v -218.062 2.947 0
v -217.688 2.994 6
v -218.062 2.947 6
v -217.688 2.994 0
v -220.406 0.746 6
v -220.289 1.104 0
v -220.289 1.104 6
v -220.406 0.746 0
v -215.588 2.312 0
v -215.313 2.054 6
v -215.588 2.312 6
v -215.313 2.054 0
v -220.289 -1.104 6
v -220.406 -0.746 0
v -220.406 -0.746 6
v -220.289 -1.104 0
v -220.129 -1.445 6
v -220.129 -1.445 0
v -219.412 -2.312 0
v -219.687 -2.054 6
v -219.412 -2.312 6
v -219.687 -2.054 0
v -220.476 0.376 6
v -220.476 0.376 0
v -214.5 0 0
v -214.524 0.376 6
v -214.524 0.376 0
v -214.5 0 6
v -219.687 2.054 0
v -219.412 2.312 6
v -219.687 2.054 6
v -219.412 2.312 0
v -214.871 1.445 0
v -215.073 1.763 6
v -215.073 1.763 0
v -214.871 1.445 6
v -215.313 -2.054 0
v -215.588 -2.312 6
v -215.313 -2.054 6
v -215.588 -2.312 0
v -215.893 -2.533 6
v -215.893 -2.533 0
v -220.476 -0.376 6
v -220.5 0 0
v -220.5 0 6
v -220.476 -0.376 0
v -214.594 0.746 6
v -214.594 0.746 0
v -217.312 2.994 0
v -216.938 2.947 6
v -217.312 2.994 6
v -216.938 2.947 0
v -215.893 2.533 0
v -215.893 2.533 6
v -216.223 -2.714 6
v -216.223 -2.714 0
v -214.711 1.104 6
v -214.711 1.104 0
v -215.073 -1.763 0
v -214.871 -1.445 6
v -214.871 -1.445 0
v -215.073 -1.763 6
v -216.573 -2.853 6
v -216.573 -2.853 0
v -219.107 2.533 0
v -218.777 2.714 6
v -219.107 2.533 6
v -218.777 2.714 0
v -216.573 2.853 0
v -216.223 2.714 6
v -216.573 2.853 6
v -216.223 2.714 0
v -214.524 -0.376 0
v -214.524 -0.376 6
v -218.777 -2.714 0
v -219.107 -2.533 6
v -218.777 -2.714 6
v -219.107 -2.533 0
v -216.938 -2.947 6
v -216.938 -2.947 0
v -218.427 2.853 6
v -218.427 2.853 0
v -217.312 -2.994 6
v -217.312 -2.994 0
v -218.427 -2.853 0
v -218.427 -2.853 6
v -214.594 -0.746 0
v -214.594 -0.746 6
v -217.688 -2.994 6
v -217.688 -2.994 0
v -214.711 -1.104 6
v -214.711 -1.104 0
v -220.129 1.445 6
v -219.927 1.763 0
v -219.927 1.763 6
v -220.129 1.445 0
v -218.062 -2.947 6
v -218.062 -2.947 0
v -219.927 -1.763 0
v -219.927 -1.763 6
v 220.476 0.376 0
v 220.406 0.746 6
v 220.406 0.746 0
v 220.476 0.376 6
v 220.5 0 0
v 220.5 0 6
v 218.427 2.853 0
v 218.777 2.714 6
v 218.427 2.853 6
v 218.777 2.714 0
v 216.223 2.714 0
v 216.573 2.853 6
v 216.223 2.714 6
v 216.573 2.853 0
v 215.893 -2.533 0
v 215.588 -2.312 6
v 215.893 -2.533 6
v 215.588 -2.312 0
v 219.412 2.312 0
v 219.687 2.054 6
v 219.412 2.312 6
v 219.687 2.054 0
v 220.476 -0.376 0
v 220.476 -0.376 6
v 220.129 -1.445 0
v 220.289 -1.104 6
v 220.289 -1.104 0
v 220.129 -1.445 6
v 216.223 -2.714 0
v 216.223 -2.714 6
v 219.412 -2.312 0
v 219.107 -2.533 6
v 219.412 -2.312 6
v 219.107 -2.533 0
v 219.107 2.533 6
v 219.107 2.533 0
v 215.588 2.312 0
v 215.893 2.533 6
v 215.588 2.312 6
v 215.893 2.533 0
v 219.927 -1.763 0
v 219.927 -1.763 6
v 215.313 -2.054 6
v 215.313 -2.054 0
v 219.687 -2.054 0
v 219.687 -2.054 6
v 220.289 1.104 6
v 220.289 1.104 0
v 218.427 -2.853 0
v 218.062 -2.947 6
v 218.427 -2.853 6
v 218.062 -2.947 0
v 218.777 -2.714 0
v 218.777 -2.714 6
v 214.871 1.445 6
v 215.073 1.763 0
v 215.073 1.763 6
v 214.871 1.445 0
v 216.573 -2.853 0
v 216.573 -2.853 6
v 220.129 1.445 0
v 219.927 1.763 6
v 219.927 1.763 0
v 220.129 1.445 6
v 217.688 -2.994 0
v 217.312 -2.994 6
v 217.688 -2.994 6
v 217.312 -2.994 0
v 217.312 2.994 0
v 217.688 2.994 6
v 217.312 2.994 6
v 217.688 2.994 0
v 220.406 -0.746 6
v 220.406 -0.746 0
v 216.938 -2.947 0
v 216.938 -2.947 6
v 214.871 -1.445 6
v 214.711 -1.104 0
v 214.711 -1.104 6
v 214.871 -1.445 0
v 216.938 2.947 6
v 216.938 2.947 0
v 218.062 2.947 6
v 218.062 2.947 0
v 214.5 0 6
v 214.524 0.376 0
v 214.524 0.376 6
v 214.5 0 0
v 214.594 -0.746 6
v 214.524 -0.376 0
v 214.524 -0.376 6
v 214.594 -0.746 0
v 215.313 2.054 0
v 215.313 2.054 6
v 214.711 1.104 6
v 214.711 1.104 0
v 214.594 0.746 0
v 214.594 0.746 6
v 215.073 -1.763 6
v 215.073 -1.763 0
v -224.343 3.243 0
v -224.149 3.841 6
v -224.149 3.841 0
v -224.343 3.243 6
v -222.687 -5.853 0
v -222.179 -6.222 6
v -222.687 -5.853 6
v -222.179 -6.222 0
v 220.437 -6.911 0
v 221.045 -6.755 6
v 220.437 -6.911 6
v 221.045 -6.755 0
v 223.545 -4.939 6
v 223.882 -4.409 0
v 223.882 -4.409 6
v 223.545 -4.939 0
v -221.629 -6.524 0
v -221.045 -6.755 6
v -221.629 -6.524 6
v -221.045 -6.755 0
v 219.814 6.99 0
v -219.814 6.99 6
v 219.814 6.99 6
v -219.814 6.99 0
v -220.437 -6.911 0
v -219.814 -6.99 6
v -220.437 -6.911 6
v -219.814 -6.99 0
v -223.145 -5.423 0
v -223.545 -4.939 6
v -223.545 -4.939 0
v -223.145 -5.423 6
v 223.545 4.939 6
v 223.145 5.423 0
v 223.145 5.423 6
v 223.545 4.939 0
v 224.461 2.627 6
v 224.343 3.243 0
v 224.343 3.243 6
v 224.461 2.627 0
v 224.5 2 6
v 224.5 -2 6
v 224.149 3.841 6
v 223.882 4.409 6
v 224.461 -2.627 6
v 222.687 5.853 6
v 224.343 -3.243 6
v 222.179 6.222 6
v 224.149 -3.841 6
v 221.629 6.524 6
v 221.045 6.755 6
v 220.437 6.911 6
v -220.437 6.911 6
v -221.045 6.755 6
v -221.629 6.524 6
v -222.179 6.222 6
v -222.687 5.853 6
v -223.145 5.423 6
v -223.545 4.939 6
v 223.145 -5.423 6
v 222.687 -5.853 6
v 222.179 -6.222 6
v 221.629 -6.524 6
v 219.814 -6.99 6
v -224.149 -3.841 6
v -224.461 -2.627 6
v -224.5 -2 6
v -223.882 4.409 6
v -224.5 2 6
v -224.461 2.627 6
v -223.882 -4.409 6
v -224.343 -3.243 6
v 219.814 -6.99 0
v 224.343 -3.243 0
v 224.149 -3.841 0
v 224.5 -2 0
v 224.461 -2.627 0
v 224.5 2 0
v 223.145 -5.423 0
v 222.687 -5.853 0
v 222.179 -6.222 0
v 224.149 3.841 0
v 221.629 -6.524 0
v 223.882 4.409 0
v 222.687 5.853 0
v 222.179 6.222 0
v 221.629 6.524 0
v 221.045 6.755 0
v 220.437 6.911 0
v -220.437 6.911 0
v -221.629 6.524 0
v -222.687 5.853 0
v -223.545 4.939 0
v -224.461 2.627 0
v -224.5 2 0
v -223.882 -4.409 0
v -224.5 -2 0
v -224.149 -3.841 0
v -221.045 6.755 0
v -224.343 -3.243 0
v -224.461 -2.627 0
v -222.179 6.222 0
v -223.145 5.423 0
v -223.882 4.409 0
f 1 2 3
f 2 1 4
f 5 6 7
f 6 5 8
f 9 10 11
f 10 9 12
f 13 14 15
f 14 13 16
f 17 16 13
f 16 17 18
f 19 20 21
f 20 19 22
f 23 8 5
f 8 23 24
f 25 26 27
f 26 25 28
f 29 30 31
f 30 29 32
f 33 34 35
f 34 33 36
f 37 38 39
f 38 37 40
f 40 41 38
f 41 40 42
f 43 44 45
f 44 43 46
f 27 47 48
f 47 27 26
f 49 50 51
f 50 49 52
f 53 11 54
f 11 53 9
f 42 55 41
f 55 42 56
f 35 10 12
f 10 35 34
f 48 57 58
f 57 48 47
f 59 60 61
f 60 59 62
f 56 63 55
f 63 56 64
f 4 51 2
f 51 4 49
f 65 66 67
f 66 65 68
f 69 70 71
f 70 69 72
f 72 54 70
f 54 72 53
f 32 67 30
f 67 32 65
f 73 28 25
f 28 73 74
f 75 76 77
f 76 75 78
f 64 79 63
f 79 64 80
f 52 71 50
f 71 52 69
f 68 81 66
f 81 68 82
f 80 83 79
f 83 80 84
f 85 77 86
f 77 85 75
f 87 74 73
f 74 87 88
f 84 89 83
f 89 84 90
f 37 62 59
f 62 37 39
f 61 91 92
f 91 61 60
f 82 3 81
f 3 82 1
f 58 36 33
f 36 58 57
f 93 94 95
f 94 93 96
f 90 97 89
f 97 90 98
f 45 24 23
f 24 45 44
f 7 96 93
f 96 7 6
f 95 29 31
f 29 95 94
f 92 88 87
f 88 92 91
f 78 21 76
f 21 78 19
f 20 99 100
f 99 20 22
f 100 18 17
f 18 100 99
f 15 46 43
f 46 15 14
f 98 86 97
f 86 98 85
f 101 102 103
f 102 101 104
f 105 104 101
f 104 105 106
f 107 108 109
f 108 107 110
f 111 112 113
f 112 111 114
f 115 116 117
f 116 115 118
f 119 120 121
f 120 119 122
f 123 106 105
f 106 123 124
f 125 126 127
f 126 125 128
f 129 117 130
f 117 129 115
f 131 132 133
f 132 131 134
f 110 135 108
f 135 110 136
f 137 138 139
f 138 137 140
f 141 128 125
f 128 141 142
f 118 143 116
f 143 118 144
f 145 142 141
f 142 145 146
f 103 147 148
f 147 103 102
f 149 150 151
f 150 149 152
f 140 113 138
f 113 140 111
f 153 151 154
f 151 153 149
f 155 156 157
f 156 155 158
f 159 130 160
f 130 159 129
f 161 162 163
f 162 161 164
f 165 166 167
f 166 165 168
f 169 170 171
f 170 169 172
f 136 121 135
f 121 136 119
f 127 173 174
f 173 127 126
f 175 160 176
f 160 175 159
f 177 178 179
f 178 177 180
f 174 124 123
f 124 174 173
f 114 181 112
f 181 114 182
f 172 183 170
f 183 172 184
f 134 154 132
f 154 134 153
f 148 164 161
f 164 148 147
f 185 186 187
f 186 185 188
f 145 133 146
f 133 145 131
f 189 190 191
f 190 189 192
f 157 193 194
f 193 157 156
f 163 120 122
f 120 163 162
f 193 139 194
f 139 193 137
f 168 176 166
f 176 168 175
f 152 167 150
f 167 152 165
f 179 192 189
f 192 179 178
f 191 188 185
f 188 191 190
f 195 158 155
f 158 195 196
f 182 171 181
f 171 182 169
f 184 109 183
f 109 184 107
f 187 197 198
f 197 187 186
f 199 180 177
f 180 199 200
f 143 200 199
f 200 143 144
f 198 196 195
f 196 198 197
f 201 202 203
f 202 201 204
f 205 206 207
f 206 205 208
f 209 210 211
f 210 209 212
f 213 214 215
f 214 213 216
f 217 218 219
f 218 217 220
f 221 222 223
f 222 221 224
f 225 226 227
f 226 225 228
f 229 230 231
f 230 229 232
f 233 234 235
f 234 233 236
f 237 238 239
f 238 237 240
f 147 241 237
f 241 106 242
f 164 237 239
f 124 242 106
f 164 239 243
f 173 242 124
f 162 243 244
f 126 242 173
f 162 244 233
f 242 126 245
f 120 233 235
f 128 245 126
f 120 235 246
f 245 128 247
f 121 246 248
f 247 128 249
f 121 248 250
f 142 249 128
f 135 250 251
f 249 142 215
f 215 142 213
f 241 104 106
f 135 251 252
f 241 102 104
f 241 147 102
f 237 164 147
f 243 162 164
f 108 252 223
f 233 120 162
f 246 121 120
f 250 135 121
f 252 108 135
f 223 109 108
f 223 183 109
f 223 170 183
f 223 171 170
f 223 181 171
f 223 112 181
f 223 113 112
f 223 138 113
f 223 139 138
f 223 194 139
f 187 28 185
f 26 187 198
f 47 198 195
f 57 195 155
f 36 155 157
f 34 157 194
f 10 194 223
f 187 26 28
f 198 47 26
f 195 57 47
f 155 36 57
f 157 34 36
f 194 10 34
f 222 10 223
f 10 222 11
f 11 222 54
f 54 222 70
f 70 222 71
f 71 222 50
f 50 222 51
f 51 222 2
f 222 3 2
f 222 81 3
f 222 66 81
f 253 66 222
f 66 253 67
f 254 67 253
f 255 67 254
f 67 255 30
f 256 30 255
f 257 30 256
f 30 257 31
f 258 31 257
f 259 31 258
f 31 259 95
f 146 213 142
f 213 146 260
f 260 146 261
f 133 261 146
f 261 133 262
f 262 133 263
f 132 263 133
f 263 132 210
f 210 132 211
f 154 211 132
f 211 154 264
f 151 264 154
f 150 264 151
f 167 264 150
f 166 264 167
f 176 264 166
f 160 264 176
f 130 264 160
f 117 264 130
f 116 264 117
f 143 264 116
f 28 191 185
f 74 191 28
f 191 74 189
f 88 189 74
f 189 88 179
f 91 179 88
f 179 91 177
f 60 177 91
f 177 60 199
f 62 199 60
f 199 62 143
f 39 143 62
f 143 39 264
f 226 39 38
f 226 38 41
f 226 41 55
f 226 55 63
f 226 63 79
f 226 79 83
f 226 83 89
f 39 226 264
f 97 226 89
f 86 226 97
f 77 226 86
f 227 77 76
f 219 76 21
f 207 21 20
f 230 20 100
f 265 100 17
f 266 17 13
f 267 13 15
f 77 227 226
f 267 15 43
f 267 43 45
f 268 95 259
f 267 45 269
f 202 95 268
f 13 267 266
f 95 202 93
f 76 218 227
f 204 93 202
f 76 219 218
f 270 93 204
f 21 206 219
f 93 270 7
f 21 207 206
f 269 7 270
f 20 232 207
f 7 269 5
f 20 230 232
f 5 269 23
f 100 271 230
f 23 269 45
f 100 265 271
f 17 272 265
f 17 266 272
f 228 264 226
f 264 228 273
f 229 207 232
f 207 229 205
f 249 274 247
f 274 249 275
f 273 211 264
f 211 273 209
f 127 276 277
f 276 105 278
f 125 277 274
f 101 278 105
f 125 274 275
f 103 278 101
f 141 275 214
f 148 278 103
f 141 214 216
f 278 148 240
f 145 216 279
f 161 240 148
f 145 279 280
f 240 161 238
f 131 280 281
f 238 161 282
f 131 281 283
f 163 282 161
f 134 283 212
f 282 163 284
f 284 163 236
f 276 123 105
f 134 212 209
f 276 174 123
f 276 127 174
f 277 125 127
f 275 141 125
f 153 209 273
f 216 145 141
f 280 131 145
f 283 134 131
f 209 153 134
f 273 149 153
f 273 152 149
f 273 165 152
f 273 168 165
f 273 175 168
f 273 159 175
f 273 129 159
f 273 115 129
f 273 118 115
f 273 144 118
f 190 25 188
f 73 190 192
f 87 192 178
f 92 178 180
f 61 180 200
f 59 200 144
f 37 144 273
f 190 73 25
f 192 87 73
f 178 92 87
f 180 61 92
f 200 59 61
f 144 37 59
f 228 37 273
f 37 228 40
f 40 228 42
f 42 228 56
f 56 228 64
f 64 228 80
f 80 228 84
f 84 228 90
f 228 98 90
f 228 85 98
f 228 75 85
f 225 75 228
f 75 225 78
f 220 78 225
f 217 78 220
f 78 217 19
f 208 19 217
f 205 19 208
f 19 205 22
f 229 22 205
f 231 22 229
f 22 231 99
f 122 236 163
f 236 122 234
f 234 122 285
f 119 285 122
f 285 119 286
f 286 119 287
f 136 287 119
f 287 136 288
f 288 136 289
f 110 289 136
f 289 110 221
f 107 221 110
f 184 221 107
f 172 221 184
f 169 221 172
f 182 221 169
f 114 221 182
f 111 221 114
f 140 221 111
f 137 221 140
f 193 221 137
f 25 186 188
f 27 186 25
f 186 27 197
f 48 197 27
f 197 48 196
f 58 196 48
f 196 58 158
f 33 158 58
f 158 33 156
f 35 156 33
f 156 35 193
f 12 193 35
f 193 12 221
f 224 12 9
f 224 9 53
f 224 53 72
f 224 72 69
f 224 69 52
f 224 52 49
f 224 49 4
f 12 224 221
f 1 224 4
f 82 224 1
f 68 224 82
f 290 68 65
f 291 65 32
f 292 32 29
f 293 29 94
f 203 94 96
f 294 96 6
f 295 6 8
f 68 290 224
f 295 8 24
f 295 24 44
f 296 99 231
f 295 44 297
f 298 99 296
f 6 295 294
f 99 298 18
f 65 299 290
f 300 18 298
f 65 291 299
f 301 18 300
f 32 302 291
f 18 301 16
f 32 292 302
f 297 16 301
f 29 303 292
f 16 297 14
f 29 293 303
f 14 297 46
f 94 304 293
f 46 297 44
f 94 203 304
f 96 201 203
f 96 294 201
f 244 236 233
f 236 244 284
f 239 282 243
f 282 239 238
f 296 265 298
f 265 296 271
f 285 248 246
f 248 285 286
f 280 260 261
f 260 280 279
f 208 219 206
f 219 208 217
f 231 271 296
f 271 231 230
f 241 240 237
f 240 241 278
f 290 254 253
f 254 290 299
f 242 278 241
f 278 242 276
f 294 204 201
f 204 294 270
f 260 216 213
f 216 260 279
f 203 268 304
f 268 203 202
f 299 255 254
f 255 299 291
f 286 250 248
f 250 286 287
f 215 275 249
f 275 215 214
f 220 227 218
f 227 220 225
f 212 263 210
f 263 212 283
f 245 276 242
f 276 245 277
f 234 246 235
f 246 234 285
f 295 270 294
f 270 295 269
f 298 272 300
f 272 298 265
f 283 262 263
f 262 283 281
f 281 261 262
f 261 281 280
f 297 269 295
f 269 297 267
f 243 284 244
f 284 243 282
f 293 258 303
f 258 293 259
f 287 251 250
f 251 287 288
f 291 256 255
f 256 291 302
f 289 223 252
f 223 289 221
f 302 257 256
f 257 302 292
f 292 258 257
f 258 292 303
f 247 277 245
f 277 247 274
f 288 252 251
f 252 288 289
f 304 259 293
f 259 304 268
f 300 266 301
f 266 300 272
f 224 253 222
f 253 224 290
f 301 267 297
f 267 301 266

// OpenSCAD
$fn = 50;


difference() {
	union() {
		hull() {
			translate(v = [-219.5000000000, 2.0000000000, 0]) {
				cylinder(h = 6, r = 5);
			}
			translate(v = [219.5000000000, 2.0000000000, 0]) {
				cylinder(h = 6, r = 5);
			}
			translate(v = [-219.5000000000, -2.0000000000, 0]) {
				cylinder(h = 6, r = 5);
			}
			translate(v = [219.5000000000, -2.0000000000, 0]) {
				cylinder(h = 6, r = 5);
			}
		}
	}
	union() {
		translate(v = [-217.5000000000, 0.0000000000, -100.0000000000]) {
			cylinder(h = 200, r = 3.0000000000);
		}
		translate(v = [-217.5000000000, 0.0000000000, -100.0000000000]) {
			cylinder(h = 200, r = 3.0000000000);
		}
		translate(v = [217.5000000000, 0.0000000000, -100.0000000000]) {
			cylinder(h = 200, r = 3.0000000000);
		}
		translate(v = [217.5000000000, 0.0000000000, -100.0000000000]) {
			cylinder(h = 200, r = 3.0000000000);
		}
	}
}
